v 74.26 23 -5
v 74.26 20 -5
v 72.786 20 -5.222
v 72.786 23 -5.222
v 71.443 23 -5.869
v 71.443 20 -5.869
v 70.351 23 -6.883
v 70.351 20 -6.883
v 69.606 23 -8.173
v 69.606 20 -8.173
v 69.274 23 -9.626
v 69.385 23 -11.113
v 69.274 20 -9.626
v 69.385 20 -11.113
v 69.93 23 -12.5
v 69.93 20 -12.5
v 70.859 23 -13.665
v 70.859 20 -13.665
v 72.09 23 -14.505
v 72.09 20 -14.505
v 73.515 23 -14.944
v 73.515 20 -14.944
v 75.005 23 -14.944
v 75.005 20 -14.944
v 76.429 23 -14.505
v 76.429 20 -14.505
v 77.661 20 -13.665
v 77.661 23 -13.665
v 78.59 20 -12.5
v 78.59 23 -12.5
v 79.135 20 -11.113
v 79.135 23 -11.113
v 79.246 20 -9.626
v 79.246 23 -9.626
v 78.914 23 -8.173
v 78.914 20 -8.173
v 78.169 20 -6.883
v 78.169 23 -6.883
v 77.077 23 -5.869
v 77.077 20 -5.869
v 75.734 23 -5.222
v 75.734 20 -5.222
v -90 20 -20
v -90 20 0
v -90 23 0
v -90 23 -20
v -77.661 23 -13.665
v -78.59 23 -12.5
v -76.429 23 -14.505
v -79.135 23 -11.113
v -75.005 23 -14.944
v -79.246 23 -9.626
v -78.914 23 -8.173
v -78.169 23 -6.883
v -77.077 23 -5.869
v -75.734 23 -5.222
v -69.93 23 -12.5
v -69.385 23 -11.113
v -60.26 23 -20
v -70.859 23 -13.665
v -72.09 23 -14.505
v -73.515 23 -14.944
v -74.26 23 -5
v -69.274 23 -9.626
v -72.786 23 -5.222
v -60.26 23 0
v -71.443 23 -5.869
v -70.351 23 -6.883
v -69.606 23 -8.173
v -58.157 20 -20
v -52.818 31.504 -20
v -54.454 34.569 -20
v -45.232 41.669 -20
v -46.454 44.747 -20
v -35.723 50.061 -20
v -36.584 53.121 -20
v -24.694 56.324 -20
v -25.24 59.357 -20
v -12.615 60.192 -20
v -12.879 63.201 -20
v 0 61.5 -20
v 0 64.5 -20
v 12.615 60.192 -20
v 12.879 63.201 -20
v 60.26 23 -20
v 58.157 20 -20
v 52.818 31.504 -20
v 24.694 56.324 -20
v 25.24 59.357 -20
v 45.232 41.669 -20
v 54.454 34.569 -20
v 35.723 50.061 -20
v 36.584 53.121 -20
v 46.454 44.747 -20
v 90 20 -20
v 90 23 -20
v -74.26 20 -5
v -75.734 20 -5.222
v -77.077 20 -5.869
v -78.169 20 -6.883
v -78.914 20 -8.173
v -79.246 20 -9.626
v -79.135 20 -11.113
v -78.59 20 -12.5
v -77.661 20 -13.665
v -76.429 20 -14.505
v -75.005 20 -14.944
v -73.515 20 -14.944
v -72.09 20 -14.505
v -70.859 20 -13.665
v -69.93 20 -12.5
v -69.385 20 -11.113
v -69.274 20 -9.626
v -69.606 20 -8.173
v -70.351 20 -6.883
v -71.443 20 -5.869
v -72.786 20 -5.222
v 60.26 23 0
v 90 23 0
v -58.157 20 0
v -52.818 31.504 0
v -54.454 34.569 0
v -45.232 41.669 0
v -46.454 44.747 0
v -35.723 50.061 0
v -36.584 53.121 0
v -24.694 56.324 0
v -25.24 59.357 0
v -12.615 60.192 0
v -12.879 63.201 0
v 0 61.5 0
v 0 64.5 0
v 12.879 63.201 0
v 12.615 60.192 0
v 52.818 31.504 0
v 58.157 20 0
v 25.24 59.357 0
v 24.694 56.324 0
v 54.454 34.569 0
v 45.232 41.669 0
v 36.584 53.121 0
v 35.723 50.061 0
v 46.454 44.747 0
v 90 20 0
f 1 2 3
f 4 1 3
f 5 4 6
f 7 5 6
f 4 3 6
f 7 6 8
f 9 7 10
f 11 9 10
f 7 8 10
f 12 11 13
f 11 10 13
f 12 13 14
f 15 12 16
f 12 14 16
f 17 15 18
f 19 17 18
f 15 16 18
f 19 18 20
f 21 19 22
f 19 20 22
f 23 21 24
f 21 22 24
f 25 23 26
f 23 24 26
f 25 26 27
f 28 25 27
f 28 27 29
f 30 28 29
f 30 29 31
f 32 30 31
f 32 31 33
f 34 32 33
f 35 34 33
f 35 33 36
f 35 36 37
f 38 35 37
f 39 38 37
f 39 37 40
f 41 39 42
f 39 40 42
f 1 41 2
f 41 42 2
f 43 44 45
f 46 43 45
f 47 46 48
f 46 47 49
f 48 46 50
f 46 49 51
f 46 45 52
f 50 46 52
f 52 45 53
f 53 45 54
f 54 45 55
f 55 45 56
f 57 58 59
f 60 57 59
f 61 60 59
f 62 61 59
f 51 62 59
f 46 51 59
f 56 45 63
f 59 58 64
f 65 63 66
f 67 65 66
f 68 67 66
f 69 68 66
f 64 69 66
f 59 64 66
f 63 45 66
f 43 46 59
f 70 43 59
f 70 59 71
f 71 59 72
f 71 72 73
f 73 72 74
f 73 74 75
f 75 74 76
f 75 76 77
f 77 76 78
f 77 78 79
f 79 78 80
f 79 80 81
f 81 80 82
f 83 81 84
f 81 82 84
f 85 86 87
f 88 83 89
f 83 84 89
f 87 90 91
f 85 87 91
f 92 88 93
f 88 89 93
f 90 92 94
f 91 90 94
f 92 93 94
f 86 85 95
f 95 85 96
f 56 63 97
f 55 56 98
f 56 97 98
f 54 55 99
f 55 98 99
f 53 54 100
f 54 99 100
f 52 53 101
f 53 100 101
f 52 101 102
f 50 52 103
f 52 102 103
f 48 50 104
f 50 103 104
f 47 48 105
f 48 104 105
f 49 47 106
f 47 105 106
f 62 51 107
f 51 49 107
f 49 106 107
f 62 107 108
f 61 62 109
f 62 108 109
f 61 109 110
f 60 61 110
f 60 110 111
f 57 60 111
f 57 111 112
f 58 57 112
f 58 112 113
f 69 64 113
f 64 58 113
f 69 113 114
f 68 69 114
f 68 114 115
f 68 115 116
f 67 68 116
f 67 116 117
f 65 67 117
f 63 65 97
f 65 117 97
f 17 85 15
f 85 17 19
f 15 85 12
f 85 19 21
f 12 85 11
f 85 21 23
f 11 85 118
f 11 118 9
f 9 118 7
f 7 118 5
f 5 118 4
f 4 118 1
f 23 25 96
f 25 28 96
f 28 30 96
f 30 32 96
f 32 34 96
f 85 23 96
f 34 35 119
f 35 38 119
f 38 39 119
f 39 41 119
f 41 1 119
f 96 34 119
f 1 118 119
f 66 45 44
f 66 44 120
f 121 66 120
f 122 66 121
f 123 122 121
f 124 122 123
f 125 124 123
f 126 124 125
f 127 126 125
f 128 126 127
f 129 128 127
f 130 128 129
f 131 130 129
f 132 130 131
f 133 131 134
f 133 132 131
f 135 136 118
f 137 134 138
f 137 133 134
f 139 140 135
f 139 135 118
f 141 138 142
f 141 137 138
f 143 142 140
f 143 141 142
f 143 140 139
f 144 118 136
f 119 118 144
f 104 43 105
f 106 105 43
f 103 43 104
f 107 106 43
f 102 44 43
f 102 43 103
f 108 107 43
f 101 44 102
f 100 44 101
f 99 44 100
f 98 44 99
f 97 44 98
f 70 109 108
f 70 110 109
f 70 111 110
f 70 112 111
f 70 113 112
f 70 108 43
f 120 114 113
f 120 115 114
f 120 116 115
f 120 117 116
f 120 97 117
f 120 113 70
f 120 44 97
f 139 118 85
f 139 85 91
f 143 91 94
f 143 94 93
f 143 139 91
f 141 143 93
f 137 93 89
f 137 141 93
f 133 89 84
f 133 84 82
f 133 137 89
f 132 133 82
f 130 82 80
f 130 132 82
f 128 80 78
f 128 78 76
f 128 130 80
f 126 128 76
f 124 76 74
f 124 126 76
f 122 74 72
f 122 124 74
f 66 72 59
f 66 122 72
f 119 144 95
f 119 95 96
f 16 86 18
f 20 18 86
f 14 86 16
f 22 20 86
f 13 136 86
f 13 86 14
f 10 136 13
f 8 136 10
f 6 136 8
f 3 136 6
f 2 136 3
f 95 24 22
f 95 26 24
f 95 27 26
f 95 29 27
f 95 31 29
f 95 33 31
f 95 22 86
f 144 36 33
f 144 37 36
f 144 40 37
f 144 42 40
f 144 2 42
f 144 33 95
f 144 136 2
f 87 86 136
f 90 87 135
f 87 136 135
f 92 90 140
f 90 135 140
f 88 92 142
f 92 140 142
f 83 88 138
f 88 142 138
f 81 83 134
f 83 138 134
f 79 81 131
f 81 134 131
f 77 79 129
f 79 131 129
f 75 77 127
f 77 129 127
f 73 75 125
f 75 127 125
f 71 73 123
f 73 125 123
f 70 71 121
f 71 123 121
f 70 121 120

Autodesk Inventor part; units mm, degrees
ref_plane "YZ Plane" through (0, 0, 0) normal (1, 0, 0) x (0, 1, 0)
ref_plane "XZ Plane" through (0, 0, 0) normal (0, 1, 0) x (-1, 0, 0)
ref_plane "XY Plane" through (0, 0, 0) normal (0, 0, 1) x (1, 0, 0)
sketch "Sketch1" plane through (0, 0, 0) normal (0, 0, 1) x (1, 0, 0)
  arc A0 (58.1571, 20) -> (-58.1571, 20) centre (0, 0) ccw
  line L0 (-90, 0) -> (90, 0) construction
  line L1 (-90, 20) -> (90, 20)
  line L2 (-90, 23) -> (90, 23)
  line L3 (-90, 20) -> (-90, 23)
  line L4 (90, 20) -> (90, 23)
  arc A1 (61.3209, 20) -> (-61.3209, 20) centre (0, 0) ccw
  point P0 (60.2599, 23)
  point P1 (-60.2599, 23)
  dimension "d8" = 123
  dimension "d12" = 90
  dimension "d13" = 90
  dimension "d14" = 0
  dimension "d15" = 20
  dimension "d16" = 3
  dimension "d17" = 129
  dimension "d18" = 180
  dimension "d19" = 90
extrude "Extrusion2" add sketch "Sketch1" against normal blind 20 contours A0 L2 A1 L1 | A0 L2 A1 | L1 A1 L2 A0 | A1 L2 L4 L1 | L1 L3 L2 A1
sketch "Sketch2" plane through (60.2599, 23, 0) normal (0, 1, 0) x (1, 0, 0)
  circle A0 centre (14, 10) radius 5
  line L0 (29.7401, 0) -> (0, 0) projected
  point P0 (-60.2599, 0)
  dimension "d22" = 10
  dimension "d23" = 10
  dimension "d24" = 14
hole "Hole1" at (74.2599, 23, -10) direction (0, -1, 0) diameter 10 end through all
ref_plane "Work Plane1" through (0, 20, 0) normal (1, 0, 0) x (0, 0, -1)
thread "Thread1" size "M10x1.5" class "6H" standard "ANSI Metric M Profile" full length
mirror "Mirror1" about plane through (0, 20, 0) normal (1, 0, 0) of "Hole1"
properties part number "Holder"
